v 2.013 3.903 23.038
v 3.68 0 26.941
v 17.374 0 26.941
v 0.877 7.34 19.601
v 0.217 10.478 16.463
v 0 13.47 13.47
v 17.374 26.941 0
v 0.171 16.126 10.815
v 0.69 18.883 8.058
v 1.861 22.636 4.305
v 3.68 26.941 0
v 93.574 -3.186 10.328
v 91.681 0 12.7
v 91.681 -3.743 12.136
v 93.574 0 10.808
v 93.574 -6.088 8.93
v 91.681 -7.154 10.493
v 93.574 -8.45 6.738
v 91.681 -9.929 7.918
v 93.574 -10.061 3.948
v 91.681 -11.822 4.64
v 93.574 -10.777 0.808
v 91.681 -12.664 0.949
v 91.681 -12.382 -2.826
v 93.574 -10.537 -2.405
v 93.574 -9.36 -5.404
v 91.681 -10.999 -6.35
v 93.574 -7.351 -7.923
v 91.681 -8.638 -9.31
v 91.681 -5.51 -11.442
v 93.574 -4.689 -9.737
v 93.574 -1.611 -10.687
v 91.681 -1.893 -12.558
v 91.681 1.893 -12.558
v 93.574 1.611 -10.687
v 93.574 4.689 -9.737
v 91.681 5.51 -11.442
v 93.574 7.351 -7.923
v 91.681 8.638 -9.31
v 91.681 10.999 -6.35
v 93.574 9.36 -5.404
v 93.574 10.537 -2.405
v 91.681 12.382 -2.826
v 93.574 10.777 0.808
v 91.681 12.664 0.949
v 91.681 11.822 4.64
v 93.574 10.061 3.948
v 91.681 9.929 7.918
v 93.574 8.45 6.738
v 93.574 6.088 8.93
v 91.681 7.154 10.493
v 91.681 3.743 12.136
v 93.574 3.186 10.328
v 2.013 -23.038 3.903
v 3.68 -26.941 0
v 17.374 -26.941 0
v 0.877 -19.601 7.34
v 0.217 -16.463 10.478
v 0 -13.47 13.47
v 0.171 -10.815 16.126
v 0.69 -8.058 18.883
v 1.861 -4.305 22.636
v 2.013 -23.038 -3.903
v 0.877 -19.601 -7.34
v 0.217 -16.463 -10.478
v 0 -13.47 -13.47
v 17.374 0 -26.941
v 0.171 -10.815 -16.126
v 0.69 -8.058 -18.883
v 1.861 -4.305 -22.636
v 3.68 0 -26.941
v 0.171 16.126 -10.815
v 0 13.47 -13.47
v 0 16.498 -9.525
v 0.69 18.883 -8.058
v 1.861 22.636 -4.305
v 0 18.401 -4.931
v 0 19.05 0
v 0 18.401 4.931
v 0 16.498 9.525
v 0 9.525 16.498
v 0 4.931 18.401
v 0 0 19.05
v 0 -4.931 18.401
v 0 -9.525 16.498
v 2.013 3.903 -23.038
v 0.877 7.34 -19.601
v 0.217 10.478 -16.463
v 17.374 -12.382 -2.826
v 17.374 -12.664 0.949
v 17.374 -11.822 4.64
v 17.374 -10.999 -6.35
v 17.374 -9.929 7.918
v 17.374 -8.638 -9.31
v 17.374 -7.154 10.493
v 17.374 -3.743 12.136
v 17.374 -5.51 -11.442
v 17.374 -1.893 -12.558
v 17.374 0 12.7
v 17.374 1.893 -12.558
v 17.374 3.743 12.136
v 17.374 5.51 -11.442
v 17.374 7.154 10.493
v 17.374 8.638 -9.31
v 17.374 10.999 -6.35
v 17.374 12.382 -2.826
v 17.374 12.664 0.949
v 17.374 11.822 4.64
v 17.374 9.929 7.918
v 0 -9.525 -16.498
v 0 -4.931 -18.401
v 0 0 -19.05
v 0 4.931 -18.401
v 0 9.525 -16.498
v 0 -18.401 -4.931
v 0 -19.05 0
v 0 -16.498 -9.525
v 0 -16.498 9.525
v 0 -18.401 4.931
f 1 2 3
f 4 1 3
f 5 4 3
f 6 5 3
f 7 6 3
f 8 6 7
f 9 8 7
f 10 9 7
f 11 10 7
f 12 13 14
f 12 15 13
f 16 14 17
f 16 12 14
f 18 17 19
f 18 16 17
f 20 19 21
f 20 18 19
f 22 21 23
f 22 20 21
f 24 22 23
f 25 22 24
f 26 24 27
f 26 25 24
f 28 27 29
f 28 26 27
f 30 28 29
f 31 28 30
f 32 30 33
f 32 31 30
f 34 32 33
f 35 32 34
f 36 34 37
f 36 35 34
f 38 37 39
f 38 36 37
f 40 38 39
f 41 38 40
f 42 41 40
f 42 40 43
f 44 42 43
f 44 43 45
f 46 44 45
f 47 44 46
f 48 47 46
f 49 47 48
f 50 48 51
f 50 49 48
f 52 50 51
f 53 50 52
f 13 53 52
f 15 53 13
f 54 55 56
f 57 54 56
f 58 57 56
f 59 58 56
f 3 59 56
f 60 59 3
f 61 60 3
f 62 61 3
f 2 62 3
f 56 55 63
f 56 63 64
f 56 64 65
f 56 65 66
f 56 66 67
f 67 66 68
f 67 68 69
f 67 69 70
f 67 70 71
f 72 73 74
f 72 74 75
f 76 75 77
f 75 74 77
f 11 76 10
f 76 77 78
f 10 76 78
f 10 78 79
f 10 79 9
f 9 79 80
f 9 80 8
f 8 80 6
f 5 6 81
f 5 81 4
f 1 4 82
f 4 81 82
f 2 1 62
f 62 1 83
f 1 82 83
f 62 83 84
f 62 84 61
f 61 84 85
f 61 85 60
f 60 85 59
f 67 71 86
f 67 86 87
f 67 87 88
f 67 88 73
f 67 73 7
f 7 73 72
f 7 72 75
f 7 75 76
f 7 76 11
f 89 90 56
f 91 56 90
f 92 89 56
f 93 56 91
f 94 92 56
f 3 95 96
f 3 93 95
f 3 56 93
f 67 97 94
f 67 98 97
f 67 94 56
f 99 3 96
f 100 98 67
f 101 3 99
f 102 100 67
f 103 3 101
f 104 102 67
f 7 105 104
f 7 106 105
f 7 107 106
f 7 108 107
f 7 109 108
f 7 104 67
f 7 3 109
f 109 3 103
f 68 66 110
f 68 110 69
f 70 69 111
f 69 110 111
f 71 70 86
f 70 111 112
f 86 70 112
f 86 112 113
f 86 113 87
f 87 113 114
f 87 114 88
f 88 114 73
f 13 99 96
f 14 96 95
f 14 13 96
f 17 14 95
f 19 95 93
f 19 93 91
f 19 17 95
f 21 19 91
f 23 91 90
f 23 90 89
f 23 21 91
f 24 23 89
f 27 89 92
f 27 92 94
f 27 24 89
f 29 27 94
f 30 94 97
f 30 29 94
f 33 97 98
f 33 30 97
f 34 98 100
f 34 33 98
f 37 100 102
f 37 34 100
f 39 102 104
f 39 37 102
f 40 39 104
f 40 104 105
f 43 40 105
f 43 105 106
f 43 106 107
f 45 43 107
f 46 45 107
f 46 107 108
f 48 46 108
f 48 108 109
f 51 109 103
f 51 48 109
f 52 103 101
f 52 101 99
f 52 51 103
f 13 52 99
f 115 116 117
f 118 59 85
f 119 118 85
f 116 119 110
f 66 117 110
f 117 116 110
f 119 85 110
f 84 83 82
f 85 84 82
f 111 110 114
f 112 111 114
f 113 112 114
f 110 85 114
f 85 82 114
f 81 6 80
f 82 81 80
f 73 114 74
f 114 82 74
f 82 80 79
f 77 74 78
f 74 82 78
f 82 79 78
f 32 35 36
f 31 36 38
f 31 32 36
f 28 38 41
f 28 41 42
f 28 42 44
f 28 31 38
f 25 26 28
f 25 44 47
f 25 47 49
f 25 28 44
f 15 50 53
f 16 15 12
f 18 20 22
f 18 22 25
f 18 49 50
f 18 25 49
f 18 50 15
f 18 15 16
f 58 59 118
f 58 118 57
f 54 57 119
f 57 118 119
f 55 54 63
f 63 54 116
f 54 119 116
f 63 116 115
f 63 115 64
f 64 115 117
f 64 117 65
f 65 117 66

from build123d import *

# Parameters (mm, degrees)
SKETCH1_W      = 38.1
SKETCH1_H      = 38.1
BASEHEAD_DEPTH = 17.3736


with BuildPart() as part:
    # Sketch1 → BaseHead (new body)
    with BuildSketch(Plane(origin=(0, 0, 0), x_dir=(0, 0.7071067811865488, -0.7071067811865462), z_dir=(1, 0, 0))):
        Rectangle(SKETCH1_W, SKETCH1_H)
    extrude(amount=BASEHEAD_DEPTH)

    # BodySke → Body (revolve)
    with BuildSketch(Plane.XY):
        Polygon((17.3736, 0), (17.3736, 12.7), (91.6813, 12.7), (93.5736, 10.8077), (93.5736, 0), align=None)
    revolve(axis=Axis((0, 0, 0), (1, 0, 0)))

    # Sketch3 → HeadChamfer (revolve, cut)
    with BuildSketch(Plane.XY):
        Polygon((0, 19.05), (-12.7, 19.05), (-12.7, 52.340768363), (15.523740234, 52.340768363), align=None)
    revolve(axis=Axis((0, 0, 0), (1, 0, 0)), mode=Mode.SUBTRACT)


solid = part.part
